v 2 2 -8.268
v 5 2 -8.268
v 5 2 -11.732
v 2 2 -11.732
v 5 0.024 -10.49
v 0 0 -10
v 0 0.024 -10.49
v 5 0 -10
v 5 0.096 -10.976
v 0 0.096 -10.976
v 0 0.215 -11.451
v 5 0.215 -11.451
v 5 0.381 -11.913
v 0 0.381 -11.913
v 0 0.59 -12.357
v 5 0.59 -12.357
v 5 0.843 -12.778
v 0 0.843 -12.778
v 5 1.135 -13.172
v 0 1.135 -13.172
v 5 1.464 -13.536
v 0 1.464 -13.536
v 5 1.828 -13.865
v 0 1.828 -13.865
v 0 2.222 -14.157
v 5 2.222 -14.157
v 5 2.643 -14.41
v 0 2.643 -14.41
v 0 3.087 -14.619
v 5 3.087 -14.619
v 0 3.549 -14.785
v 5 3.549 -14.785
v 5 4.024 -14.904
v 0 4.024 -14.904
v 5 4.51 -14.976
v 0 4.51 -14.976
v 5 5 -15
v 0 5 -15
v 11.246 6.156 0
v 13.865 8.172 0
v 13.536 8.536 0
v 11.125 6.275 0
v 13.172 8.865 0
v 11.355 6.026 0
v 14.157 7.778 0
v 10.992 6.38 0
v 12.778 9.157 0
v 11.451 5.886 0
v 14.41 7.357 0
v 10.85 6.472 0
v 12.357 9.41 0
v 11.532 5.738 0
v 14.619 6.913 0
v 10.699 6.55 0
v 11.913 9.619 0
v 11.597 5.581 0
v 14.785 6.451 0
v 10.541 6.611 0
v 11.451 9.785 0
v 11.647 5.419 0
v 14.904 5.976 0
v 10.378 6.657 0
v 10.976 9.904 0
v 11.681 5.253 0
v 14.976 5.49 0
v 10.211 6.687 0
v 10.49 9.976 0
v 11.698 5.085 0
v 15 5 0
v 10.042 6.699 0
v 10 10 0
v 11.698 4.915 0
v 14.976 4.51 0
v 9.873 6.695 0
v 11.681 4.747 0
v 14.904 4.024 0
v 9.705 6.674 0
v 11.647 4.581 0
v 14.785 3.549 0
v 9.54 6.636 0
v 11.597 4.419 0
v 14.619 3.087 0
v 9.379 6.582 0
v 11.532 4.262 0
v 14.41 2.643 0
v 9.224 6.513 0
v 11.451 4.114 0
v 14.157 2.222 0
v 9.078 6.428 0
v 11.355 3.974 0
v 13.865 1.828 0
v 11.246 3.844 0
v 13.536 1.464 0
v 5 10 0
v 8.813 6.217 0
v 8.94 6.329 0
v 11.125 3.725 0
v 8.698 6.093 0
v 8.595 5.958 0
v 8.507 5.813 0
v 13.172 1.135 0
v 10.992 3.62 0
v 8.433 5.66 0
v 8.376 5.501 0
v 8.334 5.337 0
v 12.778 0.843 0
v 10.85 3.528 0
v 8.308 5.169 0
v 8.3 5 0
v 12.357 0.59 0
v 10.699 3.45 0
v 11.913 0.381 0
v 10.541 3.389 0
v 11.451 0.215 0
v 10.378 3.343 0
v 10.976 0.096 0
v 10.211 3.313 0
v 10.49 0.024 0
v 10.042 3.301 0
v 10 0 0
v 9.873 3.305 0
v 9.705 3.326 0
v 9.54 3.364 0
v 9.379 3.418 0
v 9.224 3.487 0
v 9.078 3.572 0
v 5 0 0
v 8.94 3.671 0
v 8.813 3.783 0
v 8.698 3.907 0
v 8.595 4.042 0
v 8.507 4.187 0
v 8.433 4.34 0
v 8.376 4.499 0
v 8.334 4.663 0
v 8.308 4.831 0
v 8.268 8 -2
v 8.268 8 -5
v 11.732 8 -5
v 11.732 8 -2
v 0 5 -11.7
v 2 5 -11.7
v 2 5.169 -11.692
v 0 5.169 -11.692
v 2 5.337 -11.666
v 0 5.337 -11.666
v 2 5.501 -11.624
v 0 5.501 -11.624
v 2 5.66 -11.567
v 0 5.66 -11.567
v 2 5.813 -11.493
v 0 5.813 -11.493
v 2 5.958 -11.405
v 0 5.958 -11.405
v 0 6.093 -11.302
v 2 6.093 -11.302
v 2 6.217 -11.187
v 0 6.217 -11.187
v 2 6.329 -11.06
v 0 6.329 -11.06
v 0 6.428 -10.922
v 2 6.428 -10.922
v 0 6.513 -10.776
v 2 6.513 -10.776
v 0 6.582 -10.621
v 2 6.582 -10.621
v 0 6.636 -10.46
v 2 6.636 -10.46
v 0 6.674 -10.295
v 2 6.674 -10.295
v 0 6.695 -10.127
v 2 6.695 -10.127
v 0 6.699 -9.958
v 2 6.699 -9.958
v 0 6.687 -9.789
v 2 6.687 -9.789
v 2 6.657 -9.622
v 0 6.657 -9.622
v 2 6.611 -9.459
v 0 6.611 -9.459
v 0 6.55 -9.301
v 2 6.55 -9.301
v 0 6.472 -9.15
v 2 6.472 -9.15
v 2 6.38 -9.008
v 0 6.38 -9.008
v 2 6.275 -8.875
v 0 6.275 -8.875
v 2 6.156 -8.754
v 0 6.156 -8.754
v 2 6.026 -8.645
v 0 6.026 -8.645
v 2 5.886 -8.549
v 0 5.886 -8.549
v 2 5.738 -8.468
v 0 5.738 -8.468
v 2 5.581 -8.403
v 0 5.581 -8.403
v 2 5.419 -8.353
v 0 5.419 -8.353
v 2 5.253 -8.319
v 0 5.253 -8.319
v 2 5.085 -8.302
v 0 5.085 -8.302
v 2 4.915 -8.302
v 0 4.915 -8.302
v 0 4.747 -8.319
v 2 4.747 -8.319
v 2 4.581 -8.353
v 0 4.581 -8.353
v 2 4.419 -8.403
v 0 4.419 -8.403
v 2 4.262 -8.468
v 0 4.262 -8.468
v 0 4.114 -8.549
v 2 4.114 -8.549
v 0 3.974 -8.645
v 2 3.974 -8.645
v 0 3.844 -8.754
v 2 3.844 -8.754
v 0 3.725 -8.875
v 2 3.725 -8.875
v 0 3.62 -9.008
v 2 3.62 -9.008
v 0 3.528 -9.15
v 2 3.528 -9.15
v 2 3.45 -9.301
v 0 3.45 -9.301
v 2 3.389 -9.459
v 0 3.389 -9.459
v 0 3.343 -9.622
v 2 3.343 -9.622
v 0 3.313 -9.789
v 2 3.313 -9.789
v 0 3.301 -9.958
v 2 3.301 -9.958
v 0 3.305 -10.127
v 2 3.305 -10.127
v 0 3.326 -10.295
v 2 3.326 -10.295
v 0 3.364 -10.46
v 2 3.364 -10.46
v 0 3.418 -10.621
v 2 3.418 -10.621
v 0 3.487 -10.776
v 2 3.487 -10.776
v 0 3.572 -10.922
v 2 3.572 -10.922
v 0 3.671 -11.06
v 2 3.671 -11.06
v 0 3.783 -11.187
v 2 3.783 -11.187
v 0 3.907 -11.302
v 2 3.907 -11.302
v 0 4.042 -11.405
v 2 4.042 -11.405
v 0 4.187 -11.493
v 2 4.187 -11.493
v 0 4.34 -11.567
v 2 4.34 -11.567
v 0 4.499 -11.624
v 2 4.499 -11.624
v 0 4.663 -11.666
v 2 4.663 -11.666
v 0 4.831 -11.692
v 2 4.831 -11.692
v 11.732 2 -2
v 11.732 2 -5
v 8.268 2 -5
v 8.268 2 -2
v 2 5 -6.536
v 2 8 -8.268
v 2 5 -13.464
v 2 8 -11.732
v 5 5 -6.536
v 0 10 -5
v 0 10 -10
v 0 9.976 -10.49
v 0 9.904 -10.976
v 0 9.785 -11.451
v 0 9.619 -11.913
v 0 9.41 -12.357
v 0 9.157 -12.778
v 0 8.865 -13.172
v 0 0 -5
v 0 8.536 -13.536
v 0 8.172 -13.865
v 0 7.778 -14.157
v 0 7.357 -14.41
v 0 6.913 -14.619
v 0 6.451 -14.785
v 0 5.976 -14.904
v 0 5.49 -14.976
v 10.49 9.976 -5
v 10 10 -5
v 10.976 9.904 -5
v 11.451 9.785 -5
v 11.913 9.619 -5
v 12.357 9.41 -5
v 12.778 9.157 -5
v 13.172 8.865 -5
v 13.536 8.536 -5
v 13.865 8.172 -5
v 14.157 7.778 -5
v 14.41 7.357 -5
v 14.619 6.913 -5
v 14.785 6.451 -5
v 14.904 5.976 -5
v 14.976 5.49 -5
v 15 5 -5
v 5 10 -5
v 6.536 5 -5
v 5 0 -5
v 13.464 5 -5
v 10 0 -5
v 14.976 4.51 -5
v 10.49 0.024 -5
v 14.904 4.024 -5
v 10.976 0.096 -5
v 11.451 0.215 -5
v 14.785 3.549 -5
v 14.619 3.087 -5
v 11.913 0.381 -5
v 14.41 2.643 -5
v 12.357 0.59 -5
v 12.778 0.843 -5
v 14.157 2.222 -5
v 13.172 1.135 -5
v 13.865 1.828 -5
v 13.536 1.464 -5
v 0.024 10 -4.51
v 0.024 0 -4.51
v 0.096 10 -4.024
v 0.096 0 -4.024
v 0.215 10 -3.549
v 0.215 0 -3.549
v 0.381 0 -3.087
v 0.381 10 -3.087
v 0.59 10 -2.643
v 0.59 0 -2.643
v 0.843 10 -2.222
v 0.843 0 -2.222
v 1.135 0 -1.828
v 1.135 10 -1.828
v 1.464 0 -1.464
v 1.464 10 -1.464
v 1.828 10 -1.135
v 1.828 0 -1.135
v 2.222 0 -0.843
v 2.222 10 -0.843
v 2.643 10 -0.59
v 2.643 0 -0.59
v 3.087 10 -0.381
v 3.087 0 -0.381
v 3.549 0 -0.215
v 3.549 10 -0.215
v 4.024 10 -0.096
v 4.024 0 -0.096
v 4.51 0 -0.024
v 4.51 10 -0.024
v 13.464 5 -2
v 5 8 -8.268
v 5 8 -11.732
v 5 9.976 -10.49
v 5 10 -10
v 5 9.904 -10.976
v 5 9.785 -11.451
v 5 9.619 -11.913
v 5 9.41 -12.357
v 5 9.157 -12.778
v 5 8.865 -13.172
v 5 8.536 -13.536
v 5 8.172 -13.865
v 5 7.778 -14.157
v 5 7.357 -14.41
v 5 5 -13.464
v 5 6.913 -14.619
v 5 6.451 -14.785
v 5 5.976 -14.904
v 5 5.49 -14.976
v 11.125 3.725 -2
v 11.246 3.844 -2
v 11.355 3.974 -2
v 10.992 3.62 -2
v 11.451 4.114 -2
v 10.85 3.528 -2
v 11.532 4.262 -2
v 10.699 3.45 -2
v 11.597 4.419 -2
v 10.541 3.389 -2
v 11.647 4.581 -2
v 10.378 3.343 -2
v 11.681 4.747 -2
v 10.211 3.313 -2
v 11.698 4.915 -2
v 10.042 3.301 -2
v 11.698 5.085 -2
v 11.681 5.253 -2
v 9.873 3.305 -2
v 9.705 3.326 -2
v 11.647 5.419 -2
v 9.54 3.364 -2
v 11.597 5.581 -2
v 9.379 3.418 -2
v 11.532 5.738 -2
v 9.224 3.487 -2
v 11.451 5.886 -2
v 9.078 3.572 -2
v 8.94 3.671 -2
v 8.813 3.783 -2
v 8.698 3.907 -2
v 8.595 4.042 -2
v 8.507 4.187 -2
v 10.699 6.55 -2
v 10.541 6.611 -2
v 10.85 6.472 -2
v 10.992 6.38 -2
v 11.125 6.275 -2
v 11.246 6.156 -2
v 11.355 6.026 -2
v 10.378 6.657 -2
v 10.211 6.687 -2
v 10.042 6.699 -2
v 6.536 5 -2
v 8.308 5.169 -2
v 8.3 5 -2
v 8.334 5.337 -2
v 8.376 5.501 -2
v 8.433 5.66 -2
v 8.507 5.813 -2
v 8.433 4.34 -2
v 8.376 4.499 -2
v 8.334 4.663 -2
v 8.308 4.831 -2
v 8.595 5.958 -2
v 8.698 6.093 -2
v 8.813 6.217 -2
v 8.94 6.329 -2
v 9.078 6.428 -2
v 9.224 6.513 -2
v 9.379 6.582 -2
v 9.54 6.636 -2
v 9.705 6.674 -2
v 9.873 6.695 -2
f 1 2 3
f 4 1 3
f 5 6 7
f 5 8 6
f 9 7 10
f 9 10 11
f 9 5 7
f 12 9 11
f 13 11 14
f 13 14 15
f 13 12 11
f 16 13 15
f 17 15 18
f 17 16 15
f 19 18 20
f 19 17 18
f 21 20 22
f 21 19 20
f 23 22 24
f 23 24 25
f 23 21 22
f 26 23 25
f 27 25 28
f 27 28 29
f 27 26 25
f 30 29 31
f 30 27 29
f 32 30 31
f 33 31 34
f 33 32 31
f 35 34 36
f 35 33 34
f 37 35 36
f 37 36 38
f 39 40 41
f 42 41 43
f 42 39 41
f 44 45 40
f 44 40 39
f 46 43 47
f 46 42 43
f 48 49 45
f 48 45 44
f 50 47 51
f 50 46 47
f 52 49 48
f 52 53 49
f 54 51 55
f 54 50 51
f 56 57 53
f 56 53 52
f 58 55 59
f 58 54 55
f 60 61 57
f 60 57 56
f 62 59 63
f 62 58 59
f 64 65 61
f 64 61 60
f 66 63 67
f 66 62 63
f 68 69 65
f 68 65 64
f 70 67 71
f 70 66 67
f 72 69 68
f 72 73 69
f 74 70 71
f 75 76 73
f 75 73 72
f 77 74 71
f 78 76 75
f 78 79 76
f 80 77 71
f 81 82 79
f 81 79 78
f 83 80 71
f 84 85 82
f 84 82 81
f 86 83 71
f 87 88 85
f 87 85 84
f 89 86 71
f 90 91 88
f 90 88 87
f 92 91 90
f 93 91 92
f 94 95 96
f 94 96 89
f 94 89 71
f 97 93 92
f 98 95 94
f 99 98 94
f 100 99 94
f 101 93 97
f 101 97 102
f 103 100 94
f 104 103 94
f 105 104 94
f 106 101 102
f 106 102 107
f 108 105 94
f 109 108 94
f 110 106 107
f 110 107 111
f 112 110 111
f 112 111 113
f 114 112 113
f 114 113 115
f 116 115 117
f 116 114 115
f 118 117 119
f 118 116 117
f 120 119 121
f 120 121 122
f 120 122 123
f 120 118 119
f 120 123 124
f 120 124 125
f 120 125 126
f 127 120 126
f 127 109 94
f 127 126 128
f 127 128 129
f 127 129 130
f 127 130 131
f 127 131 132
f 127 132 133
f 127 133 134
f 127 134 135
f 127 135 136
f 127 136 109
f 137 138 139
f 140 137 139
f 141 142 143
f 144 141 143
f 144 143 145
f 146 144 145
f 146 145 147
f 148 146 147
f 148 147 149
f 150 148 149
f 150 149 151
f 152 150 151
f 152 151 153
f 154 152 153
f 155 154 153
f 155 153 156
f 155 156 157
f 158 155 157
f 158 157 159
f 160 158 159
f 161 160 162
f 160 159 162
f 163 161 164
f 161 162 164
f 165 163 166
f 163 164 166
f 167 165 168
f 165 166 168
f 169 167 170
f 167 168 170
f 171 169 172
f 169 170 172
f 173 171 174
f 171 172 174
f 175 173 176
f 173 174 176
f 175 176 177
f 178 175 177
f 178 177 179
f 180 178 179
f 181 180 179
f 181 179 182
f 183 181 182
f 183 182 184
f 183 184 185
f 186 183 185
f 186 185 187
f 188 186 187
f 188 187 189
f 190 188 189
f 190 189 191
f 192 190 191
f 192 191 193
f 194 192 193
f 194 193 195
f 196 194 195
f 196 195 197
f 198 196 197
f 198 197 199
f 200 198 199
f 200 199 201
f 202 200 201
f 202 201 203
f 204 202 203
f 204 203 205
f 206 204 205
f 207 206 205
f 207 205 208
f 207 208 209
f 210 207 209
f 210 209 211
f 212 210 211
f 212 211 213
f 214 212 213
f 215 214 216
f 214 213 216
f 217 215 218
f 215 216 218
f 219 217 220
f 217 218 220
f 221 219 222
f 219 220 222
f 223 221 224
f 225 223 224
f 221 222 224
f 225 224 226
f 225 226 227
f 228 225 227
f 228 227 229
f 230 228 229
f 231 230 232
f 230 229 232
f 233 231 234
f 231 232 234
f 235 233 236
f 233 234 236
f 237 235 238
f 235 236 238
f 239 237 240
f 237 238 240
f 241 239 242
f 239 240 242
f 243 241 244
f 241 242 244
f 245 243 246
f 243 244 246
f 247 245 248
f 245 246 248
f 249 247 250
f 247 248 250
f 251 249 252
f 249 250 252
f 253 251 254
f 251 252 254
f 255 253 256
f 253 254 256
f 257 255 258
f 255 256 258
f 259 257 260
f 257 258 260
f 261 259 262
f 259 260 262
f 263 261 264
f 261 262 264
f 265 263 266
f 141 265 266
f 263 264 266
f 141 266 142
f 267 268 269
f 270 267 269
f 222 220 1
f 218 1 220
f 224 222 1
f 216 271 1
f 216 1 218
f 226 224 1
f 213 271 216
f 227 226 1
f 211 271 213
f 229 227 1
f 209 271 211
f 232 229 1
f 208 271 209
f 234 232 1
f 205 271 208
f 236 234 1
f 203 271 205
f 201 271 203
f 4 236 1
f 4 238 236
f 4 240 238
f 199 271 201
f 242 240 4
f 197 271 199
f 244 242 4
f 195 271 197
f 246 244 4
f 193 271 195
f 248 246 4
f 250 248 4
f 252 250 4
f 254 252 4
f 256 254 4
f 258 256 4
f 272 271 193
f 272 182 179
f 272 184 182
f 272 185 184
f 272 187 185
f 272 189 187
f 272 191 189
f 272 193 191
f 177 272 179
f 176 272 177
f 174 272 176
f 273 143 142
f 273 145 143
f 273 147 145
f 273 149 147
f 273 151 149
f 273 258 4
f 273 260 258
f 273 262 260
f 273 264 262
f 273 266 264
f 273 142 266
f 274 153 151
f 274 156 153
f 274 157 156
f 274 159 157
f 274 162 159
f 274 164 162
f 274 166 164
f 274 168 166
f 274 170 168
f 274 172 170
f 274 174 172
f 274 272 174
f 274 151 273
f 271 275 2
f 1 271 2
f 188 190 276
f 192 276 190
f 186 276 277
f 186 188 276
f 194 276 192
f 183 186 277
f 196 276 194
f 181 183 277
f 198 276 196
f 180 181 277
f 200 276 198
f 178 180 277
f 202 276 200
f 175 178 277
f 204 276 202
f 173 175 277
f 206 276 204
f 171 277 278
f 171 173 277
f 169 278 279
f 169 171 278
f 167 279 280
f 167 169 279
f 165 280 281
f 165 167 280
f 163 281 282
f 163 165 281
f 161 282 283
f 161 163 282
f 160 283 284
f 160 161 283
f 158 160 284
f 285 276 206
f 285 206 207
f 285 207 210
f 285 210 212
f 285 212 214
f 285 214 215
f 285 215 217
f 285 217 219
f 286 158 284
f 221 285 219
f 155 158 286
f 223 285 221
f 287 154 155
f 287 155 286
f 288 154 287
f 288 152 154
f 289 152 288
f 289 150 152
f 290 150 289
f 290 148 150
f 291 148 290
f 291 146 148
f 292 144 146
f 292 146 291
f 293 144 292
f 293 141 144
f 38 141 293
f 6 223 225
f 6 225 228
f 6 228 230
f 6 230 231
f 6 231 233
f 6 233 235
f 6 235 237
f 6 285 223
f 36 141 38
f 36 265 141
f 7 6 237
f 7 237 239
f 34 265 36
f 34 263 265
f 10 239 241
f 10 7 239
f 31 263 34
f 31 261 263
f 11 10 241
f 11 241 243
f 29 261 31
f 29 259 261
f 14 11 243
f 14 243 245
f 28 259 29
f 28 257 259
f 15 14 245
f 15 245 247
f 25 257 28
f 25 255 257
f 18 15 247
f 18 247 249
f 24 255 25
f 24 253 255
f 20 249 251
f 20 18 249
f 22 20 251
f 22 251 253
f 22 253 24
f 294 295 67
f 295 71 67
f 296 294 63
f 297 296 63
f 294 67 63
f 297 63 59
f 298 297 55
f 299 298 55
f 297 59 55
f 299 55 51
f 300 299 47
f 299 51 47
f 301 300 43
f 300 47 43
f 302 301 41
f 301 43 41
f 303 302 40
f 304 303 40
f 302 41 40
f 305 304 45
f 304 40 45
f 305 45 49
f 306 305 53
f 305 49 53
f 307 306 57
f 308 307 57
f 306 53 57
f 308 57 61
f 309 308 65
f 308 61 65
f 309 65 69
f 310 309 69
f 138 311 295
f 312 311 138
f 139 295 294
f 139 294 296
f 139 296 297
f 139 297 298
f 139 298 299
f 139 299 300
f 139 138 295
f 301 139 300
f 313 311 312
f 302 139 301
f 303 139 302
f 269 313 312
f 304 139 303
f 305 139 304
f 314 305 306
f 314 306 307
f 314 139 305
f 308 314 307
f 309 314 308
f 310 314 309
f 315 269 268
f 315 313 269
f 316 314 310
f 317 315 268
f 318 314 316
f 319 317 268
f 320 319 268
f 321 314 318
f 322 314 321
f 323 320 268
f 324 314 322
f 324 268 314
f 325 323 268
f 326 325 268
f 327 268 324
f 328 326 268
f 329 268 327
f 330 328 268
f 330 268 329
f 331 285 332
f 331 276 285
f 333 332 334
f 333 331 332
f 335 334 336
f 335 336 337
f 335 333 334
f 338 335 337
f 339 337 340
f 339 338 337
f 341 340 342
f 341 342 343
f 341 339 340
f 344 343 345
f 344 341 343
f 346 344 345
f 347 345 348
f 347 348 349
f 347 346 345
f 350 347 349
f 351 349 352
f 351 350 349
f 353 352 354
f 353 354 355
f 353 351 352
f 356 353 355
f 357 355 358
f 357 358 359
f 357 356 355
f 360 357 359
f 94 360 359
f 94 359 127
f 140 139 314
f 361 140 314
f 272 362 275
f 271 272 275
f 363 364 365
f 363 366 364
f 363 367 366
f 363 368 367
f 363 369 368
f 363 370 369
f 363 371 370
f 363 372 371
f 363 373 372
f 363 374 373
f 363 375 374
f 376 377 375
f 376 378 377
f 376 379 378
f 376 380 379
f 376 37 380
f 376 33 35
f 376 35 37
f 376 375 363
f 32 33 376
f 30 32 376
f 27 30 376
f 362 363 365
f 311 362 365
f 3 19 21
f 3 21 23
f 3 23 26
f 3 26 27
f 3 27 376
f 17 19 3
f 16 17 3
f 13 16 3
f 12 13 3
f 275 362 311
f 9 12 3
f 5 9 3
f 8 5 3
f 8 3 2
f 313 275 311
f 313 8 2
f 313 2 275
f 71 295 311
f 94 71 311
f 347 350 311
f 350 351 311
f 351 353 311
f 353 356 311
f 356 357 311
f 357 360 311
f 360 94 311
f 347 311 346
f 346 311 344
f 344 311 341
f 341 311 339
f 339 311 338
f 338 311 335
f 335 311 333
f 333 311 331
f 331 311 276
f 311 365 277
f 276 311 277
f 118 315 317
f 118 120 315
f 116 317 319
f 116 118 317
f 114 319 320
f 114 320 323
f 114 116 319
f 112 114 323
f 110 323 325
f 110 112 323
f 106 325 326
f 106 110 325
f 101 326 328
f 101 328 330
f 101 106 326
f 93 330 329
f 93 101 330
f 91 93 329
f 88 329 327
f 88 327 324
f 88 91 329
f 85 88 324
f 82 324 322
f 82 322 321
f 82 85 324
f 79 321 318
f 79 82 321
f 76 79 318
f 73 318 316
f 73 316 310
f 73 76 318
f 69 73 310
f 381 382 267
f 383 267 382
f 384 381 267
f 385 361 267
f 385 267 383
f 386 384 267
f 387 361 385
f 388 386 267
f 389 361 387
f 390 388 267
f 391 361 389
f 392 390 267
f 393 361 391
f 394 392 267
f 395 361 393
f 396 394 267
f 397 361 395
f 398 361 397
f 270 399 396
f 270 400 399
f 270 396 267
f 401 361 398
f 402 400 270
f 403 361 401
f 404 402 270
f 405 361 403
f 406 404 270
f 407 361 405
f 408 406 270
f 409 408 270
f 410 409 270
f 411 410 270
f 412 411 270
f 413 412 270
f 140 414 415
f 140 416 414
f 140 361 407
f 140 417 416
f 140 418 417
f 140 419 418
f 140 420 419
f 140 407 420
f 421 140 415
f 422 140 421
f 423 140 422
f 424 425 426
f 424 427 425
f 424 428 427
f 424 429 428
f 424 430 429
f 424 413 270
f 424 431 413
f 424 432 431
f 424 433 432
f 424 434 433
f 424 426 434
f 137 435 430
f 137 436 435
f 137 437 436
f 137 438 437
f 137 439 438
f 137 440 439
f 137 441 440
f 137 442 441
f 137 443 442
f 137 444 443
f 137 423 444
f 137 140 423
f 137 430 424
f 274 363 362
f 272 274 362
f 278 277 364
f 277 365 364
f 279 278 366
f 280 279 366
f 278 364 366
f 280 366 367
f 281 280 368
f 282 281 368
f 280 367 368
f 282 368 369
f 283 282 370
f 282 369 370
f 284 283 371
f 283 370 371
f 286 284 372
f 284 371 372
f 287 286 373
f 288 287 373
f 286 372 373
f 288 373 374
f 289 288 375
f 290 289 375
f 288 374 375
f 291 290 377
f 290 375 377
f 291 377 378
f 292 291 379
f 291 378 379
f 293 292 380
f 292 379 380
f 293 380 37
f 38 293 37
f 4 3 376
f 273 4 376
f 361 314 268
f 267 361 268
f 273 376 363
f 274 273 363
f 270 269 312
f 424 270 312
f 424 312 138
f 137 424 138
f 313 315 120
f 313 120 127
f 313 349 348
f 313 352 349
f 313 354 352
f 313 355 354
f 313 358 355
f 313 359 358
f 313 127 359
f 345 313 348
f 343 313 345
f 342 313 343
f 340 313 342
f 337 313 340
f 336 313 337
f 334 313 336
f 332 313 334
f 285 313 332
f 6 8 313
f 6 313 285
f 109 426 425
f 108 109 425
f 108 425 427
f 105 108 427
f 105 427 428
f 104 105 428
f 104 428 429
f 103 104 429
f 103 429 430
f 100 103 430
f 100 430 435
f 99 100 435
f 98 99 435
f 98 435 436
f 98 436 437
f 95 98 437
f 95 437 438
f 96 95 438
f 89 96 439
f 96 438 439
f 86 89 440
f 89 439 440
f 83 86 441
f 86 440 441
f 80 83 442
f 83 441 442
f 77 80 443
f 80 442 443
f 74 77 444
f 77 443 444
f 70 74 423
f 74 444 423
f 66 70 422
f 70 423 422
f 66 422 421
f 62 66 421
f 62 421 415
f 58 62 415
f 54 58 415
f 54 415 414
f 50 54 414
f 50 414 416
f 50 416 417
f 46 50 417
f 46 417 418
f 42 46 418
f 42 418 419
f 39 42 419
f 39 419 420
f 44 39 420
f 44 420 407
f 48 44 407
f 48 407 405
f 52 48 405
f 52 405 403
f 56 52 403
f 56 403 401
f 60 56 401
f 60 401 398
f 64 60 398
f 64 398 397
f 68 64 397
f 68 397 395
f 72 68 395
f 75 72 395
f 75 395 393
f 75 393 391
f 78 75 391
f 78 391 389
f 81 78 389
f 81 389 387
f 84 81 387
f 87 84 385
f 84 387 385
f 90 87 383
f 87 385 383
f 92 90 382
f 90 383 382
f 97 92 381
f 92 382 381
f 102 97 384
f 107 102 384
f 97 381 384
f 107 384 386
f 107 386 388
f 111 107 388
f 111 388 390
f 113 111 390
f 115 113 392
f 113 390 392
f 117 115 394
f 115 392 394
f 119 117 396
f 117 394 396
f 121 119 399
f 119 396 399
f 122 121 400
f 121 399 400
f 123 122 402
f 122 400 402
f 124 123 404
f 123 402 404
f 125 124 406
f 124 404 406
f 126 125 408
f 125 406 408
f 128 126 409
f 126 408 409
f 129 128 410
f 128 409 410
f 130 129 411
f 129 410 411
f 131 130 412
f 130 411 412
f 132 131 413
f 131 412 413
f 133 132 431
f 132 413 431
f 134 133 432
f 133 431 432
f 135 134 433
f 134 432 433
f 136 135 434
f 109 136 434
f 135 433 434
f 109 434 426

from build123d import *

# Parameters (mm, degrees)
BOSS_EXTRUDE1_DEPTH = 10
SKETCH2_R           = 1.7
CUT_EXTRUDE1_DEPTH  = 21.615528128
SKETCH3_R           = 1.7
CUT_EXTRUDE2_DEPTH  = 21.615528128
CUT_EXTRUDE3_DEPTH  = 3
CUT_EXTRUDE4_DEPTH  = 3
FILLET1_R           = 5


with BuildPart() as part:
    # Sketch1 → Boss-Extrude1 (new body)
    with BuildSketch(Plane(origin=(0, 0, 0), x_dir=(1, 0, 0), z_dir=(0, 1, 0))):
        Polygon((0, 0), (0, 15), (5, 15), (5, 5), (15, 5), (15, 0), align=None)
    extrude(amount=BOSS_EXTRUDE1_DEPTH)

    # Sketch2 → Cut-Extrude1 (cut, through all)
    with BuildSketch(Plane(origin=(0, 0, -5), x_dir=(-1, 0, 0), z_dir=(0, 0, -1))):
        with Locations((-10, 5)):
            Circle(SKETCH2_R)
    extrude(amount=-CUT_EXTRUDE1_DEPTH, mode=Mode.SUBTRACT)

    # Sketch3 → Cut-Extrude2 (cut, through all)
    with BuildSketch(Plane(origin=(5, 0, 0), x_dir=(0, 0, -1), z_dir=(1, 0, 0))):
        with Locations((10, 5)):
            Circle(SKETCH3_R)
    extrude(amount=-CUT_EXTRUDE2_DEPTH, mode=Mode.SUBTRACT)

    # Sketch4 → Cut-Extrude3 (cut)
    with BuildSketch(Plane(origin=(5, 0, 0), x_dir=(0, 0, -1), z_dir=(1, 0, 0))):
        Polygon((13.464101615, 5), (11.732050808, 8), (8.267949192, 8), (6.535898385, 5), (8.267949192, 2), (11.732050808, 2), align=None)
    extrude(amount=-CUT_EXTRUDE3_DEPTH, mode=Mode.SUBTRACT)

    # Sketch5 → Cut-Extrude4 (cut)
    with BuildSketch(Plane(origin=(0, 0, -5), x_dir=(-1, 0, 0), z_dir=(0, 0, -1))):
        Polygon((-6.535898385, 5), (-8.267949192, 8), (-11.732050808, 8), (-13.464101615, 5), (-11.732050808, 2), (-8.267949192, 2), align=None)
    extrude(amount=-CUT_EXTRUDE4_DEPTH, mode=Mode.SUBTRACT)

    # Fillet1
    fillet1_edges = [part.edges().sort_by_distance(p)[0] for p in [
        (0, 5, 0),
        (15, 10, -2.5),
        (15, 0, -2.5),
        (2.5, 0, -15),
        (2.5, 10, -15),
    ]]
    fillet(fillet1_edges, radius=FILLET1_R - 0.0001)  # a hair under: the kernel refuses the full size


solid = part.part
